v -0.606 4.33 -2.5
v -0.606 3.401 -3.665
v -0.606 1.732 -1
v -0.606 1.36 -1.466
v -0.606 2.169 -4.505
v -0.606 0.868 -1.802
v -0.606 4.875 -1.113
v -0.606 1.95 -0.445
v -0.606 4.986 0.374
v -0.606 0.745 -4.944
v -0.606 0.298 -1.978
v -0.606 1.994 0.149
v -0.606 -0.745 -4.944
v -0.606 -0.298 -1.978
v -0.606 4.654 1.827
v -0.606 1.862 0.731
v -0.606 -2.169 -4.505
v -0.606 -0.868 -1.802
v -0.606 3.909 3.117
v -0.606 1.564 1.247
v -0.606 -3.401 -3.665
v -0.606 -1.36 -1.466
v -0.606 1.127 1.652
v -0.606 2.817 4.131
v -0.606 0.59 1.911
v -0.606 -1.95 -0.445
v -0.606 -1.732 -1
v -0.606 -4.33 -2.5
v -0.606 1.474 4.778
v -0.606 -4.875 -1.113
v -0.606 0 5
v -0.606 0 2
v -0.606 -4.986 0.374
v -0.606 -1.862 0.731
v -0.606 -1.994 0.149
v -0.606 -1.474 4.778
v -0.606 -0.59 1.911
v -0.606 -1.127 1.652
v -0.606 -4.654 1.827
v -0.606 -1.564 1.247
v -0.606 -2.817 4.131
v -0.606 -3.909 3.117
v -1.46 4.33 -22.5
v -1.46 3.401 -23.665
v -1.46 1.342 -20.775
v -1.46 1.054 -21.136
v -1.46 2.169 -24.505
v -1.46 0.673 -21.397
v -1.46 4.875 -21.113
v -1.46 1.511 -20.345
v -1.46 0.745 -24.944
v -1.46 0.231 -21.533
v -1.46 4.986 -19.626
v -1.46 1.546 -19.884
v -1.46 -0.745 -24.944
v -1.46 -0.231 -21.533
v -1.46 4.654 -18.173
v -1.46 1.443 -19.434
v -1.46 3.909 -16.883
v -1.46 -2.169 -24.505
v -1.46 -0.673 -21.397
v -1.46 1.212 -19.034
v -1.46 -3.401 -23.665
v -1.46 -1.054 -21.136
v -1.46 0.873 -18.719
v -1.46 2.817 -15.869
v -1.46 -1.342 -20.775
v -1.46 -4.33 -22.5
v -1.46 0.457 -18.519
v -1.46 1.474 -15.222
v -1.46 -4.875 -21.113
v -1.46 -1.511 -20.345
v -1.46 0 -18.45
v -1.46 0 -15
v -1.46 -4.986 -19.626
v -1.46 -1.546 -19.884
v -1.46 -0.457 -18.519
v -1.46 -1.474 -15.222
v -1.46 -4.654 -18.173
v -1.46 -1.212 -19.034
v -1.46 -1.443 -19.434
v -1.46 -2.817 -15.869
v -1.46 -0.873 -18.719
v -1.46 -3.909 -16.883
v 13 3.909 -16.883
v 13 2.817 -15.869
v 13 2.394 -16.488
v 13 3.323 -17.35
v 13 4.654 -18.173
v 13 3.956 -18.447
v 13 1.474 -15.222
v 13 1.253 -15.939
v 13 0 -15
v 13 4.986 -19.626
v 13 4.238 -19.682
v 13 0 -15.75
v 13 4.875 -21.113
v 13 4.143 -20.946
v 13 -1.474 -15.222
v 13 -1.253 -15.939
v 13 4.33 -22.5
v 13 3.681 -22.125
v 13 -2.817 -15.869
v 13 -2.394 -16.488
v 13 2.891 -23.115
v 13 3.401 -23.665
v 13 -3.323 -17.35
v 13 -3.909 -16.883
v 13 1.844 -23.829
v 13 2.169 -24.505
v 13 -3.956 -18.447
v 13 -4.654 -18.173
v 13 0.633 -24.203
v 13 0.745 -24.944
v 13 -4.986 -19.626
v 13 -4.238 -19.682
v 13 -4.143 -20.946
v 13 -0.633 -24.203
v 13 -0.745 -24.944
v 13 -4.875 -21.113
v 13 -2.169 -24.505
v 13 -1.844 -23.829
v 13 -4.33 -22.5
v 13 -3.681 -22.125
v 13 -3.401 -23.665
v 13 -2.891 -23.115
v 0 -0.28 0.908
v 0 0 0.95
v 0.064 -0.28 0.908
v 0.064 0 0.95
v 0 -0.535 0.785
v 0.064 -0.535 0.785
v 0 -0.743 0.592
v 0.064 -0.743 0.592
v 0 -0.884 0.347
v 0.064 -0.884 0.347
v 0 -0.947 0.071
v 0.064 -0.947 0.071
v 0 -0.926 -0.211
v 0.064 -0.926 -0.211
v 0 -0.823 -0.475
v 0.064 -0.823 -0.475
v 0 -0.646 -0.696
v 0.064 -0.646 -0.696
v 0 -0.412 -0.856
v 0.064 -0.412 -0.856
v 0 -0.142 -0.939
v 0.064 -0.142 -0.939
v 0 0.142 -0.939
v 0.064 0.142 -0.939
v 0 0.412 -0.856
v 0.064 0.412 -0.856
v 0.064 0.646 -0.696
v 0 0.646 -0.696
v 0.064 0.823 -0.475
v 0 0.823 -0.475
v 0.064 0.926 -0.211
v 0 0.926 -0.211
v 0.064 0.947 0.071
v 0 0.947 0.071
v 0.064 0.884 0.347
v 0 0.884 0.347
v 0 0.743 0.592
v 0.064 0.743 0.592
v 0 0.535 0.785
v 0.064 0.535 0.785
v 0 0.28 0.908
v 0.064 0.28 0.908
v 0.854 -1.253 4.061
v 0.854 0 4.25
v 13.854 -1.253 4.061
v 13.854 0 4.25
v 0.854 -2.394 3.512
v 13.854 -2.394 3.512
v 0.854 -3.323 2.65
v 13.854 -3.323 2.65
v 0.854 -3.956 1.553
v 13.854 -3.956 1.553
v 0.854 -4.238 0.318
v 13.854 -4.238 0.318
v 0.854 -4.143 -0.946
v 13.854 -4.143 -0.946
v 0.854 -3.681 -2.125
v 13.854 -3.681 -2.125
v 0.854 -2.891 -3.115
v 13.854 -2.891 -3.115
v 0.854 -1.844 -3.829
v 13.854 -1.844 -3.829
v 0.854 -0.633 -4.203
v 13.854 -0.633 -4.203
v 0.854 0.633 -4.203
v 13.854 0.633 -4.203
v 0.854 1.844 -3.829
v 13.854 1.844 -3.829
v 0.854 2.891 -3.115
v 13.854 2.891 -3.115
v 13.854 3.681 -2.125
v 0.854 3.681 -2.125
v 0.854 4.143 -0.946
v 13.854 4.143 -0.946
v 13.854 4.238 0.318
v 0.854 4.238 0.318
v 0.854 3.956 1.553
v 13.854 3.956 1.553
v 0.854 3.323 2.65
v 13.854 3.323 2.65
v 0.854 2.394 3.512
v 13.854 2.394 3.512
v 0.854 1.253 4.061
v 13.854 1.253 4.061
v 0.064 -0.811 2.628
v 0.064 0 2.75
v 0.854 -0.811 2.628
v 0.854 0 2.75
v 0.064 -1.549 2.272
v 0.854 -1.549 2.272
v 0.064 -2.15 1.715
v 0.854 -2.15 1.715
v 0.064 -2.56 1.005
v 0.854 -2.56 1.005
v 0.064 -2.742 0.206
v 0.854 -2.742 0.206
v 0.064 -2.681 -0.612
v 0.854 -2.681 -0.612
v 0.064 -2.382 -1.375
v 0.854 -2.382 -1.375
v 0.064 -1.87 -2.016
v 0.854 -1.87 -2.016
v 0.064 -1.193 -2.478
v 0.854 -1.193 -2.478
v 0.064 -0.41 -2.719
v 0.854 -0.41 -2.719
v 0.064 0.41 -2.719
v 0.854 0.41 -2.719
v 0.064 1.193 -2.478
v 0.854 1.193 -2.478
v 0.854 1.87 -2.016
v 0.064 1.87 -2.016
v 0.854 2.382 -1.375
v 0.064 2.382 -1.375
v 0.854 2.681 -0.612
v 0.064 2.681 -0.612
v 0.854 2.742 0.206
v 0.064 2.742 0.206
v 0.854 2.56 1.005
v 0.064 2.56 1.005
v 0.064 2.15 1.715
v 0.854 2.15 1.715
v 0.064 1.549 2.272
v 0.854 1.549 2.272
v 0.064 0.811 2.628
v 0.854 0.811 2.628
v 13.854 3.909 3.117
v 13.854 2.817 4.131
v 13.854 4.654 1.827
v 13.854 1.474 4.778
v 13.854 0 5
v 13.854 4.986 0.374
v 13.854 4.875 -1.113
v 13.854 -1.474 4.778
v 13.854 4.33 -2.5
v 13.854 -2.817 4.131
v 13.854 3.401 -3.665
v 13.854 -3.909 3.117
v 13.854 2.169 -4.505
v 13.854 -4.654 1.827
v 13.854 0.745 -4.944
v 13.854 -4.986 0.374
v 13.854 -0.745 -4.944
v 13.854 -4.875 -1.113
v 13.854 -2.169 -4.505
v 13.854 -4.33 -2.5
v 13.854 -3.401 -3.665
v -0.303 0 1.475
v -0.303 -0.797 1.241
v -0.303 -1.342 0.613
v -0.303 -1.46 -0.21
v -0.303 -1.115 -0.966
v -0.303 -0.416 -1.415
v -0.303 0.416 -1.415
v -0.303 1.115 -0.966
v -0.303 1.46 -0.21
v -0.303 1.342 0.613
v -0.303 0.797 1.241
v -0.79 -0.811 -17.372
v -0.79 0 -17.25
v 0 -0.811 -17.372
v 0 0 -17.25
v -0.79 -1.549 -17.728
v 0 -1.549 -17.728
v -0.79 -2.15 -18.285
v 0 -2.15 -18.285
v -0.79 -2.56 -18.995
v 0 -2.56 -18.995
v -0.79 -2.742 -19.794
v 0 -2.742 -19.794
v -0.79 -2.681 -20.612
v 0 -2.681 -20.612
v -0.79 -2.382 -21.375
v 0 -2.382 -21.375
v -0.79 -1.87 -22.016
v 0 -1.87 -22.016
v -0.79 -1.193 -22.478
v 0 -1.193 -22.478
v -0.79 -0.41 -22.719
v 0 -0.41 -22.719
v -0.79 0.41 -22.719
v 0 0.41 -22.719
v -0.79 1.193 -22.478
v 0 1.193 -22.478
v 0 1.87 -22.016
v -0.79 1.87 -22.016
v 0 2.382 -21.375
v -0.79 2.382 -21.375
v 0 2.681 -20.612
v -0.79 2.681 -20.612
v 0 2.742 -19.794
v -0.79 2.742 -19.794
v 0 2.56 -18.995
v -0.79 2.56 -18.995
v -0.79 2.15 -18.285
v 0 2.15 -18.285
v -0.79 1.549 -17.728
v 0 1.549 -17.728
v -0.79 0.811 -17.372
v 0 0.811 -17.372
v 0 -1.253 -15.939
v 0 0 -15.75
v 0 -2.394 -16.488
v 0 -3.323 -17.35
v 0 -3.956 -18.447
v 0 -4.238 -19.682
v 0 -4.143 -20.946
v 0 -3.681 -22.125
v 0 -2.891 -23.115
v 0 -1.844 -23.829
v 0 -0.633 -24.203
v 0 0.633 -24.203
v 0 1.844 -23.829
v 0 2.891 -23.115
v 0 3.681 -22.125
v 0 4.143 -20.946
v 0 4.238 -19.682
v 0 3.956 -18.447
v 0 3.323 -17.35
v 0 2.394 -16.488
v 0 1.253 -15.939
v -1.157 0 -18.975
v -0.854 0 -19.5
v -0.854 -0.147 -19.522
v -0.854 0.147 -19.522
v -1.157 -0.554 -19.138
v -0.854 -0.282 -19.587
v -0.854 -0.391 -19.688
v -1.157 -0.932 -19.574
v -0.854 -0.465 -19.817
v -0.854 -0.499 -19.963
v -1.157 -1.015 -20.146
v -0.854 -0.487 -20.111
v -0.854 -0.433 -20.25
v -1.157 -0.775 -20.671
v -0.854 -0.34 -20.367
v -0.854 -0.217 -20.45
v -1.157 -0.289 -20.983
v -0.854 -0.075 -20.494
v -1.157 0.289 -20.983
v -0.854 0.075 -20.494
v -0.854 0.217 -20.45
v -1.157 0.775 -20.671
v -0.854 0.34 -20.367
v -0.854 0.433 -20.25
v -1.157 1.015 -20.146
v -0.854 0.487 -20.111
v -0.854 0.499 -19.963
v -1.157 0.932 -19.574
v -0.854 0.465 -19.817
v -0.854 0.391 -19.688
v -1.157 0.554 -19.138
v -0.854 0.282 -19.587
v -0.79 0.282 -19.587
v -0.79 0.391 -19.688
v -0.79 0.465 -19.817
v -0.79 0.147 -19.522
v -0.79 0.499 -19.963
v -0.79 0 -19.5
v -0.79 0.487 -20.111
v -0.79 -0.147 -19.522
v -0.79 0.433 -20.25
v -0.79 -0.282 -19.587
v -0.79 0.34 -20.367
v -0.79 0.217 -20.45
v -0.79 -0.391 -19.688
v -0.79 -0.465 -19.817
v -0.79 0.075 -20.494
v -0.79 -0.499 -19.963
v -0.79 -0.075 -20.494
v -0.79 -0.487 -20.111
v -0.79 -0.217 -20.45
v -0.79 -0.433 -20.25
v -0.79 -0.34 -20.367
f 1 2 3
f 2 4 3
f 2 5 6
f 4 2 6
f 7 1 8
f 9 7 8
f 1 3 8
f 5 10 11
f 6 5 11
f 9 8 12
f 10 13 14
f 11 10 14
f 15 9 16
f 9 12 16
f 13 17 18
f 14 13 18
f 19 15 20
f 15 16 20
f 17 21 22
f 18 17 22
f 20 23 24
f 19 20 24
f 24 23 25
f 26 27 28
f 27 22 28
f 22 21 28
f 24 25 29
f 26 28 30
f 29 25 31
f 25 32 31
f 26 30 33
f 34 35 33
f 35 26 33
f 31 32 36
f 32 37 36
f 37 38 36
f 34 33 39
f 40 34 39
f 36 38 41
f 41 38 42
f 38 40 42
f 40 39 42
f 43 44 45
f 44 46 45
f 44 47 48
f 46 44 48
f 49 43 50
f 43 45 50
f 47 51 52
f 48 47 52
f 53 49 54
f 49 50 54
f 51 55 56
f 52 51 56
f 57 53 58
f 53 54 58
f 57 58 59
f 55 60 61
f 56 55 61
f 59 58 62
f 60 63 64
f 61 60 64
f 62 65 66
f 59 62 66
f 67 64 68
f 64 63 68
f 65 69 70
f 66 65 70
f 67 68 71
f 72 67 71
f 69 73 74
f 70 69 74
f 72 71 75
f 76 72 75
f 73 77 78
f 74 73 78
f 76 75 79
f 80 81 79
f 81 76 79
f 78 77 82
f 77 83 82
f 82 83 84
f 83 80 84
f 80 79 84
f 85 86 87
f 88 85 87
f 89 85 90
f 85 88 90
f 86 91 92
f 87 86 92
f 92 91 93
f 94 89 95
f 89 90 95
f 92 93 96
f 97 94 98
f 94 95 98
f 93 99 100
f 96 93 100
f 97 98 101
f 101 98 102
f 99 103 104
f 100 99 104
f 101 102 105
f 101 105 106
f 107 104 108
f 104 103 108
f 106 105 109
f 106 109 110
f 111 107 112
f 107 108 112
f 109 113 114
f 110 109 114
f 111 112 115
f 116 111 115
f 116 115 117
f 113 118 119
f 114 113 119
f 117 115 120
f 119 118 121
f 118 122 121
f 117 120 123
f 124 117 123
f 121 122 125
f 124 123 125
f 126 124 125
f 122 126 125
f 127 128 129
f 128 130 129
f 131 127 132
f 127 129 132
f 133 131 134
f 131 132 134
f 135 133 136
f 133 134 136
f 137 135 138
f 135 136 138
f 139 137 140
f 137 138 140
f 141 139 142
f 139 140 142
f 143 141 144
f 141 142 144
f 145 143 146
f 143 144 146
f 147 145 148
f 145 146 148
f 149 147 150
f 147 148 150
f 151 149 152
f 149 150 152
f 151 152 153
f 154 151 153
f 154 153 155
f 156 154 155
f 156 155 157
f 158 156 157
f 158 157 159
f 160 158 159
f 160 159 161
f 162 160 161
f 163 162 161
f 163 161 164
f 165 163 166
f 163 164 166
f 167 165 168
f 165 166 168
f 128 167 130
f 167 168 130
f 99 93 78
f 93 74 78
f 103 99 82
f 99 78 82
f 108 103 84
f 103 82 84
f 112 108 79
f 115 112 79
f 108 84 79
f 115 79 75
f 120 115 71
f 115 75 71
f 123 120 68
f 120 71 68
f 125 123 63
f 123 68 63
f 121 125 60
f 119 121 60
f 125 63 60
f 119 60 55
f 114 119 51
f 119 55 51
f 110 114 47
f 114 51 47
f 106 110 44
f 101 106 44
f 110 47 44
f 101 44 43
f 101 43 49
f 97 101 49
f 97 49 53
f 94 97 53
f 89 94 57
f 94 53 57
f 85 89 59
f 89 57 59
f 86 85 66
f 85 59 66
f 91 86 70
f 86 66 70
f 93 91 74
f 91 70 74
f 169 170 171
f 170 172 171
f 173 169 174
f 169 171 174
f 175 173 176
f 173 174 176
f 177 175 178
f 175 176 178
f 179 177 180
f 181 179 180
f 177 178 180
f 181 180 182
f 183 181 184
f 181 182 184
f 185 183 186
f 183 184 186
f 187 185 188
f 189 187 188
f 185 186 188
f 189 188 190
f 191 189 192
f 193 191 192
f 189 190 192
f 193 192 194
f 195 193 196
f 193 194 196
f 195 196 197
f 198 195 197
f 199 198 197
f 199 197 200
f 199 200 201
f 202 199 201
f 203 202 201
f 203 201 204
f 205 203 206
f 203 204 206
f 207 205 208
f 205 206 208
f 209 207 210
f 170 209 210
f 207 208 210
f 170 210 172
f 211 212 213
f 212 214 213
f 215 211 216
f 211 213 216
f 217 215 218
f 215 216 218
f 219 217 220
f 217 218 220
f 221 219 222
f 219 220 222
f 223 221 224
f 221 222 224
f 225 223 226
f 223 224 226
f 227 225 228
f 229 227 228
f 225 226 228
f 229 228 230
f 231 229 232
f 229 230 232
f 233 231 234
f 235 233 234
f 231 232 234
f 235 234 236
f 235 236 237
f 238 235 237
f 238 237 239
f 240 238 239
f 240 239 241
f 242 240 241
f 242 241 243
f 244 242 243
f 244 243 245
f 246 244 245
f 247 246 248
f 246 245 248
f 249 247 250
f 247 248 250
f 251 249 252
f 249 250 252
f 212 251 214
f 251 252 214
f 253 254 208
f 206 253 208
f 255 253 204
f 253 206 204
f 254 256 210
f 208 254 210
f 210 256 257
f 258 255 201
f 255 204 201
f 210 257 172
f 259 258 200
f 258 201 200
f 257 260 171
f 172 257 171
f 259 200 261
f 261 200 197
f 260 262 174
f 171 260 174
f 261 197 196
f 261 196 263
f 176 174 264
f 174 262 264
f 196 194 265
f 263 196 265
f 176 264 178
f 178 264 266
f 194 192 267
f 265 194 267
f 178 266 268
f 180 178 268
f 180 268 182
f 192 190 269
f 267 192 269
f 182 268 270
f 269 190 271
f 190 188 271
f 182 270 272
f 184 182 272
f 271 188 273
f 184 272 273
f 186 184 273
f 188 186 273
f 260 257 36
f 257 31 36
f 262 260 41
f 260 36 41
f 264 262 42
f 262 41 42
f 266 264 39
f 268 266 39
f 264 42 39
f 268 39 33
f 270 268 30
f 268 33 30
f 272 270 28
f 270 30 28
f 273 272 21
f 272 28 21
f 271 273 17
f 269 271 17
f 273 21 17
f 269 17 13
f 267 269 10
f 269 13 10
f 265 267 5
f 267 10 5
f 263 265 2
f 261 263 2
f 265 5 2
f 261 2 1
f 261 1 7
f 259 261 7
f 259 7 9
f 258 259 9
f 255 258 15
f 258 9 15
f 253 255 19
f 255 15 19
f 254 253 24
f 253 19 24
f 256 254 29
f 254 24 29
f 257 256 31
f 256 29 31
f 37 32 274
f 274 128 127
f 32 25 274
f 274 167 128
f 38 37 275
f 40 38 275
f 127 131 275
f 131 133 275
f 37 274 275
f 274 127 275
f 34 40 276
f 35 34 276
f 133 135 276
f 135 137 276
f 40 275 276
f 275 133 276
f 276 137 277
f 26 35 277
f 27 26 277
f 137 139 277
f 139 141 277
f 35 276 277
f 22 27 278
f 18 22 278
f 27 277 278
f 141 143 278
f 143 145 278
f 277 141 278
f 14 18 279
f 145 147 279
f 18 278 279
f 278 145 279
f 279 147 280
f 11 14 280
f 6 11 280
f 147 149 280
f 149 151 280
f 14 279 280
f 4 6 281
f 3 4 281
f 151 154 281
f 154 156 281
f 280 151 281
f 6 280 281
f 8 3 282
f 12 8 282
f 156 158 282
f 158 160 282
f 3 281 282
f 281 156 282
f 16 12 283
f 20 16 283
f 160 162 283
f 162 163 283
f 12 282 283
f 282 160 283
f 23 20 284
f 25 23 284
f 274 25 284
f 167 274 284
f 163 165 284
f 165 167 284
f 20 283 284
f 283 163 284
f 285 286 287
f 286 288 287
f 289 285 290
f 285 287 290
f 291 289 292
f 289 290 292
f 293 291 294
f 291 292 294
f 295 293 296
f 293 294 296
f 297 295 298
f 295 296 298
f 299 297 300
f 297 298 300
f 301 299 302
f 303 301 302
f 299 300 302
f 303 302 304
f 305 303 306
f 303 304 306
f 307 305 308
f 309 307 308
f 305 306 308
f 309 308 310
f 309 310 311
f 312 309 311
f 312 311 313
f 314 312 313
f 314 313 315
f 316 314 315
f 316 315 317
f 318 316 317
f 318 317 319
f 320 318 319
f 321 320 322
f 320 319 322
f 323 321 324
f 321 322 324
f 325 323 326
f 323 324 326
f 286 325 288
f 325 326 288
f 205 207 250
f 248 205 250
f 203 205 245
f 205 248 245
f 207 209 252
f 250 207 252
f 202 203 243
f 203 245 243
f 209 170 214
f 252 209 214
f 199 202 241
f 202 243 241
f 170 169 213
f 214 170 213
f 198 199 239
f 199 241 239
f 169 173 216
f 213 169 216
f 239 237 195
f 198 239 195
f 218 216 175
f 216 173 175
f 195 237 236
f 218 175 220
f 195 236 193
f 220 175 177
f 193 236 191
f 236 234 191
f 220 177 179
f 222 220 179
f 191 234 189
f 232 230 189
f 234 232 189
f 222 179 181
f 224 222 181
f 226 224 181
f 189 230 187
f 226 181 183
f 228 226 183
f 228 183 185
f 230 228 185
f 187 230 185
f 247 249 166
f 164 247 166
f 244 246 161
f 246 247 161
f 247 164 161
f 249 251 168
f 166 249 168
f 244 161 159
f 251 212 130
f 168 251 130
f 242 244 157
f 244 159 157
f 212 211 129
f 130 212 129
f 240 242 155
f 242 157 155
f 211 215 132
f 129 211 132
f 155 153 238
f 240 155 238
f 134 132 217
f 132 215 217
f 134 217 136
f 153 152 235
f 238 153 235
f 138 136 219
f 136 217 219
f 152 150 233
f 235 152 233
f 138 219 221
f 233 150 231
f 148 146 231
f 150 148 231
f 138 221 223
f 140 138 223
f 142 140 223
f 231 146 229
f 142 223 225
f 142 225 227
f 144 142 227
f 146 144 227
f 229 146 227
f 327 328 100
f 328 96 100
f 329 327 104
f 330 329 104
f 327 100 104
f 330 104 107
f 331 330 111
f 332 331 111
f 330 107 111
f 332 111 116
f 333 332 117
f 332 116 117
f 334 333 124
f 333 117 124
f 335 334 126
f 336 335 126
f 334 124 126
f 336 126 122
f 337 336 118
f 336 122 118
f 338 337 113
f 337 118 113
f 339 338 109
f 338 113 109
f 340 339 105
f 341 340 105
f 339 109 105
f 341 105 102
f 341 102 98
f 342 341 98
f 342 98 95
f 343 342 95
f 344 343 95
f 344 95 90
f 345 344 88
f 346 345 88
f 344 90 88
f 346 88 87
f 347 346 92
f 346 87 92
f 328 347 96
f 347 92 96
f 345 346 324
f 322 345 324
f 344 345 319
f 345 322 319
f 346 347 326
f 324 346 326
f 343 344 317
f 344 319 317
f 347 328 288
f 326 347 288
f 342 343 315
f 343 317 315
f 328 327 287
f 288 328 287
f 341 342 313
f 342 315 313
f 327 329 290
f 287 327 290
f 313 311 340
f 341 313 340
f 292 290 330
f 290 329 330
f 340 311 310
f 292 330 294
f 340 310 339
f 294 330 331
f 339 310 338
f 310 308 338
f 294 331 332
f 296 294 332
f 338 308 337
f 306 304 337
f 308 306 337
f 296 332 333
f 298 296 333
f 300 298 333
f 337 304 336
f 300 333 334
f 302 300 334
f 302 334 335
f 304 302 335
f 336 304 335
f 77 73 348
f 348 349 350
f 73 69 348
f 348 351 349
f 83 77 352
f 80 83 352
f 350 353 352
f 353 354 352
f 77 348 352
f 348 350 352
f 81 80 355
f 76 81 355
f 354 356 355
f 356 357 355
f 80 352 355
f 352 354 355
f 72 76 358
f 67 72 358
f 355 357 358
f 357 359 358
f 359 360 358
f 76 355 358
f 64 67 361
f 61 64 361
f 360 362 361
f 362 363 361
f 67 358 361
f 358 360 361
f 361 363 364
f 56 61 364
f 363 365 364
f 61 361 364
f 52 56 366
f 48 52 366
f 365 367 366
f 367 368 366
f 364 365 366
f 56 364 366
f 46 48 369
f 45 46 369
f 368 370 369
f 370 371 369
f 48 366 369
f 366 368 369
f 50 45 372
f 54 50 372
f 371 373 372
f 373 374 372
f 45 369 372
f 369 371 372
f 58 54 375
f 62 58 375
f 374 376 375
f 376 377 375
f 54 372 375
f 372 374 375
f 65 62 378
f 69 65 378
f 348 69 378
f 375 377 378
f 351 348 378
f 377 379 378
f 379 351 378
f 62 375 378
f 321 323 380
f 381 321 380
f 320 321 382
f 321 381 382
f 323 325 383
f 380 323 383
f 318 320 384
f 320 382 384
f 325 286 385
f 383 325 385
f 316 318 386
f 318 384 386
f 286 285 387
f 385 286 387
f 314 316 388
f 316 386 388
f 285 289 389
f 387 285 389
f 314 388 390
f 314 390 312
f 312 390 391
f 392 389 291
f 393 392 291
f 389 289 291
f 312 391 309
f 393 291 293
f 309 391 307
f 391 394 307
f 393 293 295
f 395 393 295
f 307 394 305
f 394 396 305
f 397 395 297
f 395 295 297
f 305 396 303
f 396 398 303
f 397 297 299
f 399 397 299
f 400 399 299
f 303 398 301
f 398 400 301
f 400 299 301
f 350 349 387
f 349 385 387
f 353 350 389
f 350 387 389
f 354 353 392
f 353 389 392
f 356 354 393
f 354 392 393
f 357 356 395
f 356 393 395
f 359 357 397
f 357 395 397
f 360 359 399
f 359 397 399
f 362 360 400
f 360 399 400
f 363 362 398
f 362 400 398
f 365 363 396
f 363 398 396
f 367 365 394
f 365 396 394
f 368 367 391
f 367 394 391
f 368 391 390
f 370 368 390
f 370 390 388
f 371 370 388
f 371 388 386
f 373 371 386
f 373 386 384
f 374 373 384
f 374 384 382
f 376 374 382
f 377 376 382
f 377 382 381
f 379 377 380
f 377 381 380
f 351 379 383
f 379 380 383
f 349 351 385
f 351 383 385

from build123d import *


with BuildPart() as f1:
    # F0 (on Front) → F1 (revolve)
    with BuildSketch(Plane.XZ):
        Polygon((-0.606218, 2), (0, 0.95), (0.063782, 0.95), (0.063782, 2.75), (0.853782, 2.75), (0.853782, 4.25), (13.853782, 4.25), (13.853782, 5), (-0.606218, 5), align=None)
    revolve(axis=Axis((2.115859, 0, 0), (1, 0, 0)))


with BuildPart() as f2:
    # F0 (on Front) → F2 (revolve)
    with BuildSketch(Plane.XZ):
        Polygon((-1.46, -18.45), (-0.853782, -19.5), (-0.79, -19.5), (-0.79, -17.25), (0, -17.25), (0, -15.75), (13, -15.75), (13, -15), (-1.46, -15), align=None)
    revolve(axis=Axis((1.154894, 0, -20), (1, 0, 0)))


solid = Compound([f1.part, f2.part])
